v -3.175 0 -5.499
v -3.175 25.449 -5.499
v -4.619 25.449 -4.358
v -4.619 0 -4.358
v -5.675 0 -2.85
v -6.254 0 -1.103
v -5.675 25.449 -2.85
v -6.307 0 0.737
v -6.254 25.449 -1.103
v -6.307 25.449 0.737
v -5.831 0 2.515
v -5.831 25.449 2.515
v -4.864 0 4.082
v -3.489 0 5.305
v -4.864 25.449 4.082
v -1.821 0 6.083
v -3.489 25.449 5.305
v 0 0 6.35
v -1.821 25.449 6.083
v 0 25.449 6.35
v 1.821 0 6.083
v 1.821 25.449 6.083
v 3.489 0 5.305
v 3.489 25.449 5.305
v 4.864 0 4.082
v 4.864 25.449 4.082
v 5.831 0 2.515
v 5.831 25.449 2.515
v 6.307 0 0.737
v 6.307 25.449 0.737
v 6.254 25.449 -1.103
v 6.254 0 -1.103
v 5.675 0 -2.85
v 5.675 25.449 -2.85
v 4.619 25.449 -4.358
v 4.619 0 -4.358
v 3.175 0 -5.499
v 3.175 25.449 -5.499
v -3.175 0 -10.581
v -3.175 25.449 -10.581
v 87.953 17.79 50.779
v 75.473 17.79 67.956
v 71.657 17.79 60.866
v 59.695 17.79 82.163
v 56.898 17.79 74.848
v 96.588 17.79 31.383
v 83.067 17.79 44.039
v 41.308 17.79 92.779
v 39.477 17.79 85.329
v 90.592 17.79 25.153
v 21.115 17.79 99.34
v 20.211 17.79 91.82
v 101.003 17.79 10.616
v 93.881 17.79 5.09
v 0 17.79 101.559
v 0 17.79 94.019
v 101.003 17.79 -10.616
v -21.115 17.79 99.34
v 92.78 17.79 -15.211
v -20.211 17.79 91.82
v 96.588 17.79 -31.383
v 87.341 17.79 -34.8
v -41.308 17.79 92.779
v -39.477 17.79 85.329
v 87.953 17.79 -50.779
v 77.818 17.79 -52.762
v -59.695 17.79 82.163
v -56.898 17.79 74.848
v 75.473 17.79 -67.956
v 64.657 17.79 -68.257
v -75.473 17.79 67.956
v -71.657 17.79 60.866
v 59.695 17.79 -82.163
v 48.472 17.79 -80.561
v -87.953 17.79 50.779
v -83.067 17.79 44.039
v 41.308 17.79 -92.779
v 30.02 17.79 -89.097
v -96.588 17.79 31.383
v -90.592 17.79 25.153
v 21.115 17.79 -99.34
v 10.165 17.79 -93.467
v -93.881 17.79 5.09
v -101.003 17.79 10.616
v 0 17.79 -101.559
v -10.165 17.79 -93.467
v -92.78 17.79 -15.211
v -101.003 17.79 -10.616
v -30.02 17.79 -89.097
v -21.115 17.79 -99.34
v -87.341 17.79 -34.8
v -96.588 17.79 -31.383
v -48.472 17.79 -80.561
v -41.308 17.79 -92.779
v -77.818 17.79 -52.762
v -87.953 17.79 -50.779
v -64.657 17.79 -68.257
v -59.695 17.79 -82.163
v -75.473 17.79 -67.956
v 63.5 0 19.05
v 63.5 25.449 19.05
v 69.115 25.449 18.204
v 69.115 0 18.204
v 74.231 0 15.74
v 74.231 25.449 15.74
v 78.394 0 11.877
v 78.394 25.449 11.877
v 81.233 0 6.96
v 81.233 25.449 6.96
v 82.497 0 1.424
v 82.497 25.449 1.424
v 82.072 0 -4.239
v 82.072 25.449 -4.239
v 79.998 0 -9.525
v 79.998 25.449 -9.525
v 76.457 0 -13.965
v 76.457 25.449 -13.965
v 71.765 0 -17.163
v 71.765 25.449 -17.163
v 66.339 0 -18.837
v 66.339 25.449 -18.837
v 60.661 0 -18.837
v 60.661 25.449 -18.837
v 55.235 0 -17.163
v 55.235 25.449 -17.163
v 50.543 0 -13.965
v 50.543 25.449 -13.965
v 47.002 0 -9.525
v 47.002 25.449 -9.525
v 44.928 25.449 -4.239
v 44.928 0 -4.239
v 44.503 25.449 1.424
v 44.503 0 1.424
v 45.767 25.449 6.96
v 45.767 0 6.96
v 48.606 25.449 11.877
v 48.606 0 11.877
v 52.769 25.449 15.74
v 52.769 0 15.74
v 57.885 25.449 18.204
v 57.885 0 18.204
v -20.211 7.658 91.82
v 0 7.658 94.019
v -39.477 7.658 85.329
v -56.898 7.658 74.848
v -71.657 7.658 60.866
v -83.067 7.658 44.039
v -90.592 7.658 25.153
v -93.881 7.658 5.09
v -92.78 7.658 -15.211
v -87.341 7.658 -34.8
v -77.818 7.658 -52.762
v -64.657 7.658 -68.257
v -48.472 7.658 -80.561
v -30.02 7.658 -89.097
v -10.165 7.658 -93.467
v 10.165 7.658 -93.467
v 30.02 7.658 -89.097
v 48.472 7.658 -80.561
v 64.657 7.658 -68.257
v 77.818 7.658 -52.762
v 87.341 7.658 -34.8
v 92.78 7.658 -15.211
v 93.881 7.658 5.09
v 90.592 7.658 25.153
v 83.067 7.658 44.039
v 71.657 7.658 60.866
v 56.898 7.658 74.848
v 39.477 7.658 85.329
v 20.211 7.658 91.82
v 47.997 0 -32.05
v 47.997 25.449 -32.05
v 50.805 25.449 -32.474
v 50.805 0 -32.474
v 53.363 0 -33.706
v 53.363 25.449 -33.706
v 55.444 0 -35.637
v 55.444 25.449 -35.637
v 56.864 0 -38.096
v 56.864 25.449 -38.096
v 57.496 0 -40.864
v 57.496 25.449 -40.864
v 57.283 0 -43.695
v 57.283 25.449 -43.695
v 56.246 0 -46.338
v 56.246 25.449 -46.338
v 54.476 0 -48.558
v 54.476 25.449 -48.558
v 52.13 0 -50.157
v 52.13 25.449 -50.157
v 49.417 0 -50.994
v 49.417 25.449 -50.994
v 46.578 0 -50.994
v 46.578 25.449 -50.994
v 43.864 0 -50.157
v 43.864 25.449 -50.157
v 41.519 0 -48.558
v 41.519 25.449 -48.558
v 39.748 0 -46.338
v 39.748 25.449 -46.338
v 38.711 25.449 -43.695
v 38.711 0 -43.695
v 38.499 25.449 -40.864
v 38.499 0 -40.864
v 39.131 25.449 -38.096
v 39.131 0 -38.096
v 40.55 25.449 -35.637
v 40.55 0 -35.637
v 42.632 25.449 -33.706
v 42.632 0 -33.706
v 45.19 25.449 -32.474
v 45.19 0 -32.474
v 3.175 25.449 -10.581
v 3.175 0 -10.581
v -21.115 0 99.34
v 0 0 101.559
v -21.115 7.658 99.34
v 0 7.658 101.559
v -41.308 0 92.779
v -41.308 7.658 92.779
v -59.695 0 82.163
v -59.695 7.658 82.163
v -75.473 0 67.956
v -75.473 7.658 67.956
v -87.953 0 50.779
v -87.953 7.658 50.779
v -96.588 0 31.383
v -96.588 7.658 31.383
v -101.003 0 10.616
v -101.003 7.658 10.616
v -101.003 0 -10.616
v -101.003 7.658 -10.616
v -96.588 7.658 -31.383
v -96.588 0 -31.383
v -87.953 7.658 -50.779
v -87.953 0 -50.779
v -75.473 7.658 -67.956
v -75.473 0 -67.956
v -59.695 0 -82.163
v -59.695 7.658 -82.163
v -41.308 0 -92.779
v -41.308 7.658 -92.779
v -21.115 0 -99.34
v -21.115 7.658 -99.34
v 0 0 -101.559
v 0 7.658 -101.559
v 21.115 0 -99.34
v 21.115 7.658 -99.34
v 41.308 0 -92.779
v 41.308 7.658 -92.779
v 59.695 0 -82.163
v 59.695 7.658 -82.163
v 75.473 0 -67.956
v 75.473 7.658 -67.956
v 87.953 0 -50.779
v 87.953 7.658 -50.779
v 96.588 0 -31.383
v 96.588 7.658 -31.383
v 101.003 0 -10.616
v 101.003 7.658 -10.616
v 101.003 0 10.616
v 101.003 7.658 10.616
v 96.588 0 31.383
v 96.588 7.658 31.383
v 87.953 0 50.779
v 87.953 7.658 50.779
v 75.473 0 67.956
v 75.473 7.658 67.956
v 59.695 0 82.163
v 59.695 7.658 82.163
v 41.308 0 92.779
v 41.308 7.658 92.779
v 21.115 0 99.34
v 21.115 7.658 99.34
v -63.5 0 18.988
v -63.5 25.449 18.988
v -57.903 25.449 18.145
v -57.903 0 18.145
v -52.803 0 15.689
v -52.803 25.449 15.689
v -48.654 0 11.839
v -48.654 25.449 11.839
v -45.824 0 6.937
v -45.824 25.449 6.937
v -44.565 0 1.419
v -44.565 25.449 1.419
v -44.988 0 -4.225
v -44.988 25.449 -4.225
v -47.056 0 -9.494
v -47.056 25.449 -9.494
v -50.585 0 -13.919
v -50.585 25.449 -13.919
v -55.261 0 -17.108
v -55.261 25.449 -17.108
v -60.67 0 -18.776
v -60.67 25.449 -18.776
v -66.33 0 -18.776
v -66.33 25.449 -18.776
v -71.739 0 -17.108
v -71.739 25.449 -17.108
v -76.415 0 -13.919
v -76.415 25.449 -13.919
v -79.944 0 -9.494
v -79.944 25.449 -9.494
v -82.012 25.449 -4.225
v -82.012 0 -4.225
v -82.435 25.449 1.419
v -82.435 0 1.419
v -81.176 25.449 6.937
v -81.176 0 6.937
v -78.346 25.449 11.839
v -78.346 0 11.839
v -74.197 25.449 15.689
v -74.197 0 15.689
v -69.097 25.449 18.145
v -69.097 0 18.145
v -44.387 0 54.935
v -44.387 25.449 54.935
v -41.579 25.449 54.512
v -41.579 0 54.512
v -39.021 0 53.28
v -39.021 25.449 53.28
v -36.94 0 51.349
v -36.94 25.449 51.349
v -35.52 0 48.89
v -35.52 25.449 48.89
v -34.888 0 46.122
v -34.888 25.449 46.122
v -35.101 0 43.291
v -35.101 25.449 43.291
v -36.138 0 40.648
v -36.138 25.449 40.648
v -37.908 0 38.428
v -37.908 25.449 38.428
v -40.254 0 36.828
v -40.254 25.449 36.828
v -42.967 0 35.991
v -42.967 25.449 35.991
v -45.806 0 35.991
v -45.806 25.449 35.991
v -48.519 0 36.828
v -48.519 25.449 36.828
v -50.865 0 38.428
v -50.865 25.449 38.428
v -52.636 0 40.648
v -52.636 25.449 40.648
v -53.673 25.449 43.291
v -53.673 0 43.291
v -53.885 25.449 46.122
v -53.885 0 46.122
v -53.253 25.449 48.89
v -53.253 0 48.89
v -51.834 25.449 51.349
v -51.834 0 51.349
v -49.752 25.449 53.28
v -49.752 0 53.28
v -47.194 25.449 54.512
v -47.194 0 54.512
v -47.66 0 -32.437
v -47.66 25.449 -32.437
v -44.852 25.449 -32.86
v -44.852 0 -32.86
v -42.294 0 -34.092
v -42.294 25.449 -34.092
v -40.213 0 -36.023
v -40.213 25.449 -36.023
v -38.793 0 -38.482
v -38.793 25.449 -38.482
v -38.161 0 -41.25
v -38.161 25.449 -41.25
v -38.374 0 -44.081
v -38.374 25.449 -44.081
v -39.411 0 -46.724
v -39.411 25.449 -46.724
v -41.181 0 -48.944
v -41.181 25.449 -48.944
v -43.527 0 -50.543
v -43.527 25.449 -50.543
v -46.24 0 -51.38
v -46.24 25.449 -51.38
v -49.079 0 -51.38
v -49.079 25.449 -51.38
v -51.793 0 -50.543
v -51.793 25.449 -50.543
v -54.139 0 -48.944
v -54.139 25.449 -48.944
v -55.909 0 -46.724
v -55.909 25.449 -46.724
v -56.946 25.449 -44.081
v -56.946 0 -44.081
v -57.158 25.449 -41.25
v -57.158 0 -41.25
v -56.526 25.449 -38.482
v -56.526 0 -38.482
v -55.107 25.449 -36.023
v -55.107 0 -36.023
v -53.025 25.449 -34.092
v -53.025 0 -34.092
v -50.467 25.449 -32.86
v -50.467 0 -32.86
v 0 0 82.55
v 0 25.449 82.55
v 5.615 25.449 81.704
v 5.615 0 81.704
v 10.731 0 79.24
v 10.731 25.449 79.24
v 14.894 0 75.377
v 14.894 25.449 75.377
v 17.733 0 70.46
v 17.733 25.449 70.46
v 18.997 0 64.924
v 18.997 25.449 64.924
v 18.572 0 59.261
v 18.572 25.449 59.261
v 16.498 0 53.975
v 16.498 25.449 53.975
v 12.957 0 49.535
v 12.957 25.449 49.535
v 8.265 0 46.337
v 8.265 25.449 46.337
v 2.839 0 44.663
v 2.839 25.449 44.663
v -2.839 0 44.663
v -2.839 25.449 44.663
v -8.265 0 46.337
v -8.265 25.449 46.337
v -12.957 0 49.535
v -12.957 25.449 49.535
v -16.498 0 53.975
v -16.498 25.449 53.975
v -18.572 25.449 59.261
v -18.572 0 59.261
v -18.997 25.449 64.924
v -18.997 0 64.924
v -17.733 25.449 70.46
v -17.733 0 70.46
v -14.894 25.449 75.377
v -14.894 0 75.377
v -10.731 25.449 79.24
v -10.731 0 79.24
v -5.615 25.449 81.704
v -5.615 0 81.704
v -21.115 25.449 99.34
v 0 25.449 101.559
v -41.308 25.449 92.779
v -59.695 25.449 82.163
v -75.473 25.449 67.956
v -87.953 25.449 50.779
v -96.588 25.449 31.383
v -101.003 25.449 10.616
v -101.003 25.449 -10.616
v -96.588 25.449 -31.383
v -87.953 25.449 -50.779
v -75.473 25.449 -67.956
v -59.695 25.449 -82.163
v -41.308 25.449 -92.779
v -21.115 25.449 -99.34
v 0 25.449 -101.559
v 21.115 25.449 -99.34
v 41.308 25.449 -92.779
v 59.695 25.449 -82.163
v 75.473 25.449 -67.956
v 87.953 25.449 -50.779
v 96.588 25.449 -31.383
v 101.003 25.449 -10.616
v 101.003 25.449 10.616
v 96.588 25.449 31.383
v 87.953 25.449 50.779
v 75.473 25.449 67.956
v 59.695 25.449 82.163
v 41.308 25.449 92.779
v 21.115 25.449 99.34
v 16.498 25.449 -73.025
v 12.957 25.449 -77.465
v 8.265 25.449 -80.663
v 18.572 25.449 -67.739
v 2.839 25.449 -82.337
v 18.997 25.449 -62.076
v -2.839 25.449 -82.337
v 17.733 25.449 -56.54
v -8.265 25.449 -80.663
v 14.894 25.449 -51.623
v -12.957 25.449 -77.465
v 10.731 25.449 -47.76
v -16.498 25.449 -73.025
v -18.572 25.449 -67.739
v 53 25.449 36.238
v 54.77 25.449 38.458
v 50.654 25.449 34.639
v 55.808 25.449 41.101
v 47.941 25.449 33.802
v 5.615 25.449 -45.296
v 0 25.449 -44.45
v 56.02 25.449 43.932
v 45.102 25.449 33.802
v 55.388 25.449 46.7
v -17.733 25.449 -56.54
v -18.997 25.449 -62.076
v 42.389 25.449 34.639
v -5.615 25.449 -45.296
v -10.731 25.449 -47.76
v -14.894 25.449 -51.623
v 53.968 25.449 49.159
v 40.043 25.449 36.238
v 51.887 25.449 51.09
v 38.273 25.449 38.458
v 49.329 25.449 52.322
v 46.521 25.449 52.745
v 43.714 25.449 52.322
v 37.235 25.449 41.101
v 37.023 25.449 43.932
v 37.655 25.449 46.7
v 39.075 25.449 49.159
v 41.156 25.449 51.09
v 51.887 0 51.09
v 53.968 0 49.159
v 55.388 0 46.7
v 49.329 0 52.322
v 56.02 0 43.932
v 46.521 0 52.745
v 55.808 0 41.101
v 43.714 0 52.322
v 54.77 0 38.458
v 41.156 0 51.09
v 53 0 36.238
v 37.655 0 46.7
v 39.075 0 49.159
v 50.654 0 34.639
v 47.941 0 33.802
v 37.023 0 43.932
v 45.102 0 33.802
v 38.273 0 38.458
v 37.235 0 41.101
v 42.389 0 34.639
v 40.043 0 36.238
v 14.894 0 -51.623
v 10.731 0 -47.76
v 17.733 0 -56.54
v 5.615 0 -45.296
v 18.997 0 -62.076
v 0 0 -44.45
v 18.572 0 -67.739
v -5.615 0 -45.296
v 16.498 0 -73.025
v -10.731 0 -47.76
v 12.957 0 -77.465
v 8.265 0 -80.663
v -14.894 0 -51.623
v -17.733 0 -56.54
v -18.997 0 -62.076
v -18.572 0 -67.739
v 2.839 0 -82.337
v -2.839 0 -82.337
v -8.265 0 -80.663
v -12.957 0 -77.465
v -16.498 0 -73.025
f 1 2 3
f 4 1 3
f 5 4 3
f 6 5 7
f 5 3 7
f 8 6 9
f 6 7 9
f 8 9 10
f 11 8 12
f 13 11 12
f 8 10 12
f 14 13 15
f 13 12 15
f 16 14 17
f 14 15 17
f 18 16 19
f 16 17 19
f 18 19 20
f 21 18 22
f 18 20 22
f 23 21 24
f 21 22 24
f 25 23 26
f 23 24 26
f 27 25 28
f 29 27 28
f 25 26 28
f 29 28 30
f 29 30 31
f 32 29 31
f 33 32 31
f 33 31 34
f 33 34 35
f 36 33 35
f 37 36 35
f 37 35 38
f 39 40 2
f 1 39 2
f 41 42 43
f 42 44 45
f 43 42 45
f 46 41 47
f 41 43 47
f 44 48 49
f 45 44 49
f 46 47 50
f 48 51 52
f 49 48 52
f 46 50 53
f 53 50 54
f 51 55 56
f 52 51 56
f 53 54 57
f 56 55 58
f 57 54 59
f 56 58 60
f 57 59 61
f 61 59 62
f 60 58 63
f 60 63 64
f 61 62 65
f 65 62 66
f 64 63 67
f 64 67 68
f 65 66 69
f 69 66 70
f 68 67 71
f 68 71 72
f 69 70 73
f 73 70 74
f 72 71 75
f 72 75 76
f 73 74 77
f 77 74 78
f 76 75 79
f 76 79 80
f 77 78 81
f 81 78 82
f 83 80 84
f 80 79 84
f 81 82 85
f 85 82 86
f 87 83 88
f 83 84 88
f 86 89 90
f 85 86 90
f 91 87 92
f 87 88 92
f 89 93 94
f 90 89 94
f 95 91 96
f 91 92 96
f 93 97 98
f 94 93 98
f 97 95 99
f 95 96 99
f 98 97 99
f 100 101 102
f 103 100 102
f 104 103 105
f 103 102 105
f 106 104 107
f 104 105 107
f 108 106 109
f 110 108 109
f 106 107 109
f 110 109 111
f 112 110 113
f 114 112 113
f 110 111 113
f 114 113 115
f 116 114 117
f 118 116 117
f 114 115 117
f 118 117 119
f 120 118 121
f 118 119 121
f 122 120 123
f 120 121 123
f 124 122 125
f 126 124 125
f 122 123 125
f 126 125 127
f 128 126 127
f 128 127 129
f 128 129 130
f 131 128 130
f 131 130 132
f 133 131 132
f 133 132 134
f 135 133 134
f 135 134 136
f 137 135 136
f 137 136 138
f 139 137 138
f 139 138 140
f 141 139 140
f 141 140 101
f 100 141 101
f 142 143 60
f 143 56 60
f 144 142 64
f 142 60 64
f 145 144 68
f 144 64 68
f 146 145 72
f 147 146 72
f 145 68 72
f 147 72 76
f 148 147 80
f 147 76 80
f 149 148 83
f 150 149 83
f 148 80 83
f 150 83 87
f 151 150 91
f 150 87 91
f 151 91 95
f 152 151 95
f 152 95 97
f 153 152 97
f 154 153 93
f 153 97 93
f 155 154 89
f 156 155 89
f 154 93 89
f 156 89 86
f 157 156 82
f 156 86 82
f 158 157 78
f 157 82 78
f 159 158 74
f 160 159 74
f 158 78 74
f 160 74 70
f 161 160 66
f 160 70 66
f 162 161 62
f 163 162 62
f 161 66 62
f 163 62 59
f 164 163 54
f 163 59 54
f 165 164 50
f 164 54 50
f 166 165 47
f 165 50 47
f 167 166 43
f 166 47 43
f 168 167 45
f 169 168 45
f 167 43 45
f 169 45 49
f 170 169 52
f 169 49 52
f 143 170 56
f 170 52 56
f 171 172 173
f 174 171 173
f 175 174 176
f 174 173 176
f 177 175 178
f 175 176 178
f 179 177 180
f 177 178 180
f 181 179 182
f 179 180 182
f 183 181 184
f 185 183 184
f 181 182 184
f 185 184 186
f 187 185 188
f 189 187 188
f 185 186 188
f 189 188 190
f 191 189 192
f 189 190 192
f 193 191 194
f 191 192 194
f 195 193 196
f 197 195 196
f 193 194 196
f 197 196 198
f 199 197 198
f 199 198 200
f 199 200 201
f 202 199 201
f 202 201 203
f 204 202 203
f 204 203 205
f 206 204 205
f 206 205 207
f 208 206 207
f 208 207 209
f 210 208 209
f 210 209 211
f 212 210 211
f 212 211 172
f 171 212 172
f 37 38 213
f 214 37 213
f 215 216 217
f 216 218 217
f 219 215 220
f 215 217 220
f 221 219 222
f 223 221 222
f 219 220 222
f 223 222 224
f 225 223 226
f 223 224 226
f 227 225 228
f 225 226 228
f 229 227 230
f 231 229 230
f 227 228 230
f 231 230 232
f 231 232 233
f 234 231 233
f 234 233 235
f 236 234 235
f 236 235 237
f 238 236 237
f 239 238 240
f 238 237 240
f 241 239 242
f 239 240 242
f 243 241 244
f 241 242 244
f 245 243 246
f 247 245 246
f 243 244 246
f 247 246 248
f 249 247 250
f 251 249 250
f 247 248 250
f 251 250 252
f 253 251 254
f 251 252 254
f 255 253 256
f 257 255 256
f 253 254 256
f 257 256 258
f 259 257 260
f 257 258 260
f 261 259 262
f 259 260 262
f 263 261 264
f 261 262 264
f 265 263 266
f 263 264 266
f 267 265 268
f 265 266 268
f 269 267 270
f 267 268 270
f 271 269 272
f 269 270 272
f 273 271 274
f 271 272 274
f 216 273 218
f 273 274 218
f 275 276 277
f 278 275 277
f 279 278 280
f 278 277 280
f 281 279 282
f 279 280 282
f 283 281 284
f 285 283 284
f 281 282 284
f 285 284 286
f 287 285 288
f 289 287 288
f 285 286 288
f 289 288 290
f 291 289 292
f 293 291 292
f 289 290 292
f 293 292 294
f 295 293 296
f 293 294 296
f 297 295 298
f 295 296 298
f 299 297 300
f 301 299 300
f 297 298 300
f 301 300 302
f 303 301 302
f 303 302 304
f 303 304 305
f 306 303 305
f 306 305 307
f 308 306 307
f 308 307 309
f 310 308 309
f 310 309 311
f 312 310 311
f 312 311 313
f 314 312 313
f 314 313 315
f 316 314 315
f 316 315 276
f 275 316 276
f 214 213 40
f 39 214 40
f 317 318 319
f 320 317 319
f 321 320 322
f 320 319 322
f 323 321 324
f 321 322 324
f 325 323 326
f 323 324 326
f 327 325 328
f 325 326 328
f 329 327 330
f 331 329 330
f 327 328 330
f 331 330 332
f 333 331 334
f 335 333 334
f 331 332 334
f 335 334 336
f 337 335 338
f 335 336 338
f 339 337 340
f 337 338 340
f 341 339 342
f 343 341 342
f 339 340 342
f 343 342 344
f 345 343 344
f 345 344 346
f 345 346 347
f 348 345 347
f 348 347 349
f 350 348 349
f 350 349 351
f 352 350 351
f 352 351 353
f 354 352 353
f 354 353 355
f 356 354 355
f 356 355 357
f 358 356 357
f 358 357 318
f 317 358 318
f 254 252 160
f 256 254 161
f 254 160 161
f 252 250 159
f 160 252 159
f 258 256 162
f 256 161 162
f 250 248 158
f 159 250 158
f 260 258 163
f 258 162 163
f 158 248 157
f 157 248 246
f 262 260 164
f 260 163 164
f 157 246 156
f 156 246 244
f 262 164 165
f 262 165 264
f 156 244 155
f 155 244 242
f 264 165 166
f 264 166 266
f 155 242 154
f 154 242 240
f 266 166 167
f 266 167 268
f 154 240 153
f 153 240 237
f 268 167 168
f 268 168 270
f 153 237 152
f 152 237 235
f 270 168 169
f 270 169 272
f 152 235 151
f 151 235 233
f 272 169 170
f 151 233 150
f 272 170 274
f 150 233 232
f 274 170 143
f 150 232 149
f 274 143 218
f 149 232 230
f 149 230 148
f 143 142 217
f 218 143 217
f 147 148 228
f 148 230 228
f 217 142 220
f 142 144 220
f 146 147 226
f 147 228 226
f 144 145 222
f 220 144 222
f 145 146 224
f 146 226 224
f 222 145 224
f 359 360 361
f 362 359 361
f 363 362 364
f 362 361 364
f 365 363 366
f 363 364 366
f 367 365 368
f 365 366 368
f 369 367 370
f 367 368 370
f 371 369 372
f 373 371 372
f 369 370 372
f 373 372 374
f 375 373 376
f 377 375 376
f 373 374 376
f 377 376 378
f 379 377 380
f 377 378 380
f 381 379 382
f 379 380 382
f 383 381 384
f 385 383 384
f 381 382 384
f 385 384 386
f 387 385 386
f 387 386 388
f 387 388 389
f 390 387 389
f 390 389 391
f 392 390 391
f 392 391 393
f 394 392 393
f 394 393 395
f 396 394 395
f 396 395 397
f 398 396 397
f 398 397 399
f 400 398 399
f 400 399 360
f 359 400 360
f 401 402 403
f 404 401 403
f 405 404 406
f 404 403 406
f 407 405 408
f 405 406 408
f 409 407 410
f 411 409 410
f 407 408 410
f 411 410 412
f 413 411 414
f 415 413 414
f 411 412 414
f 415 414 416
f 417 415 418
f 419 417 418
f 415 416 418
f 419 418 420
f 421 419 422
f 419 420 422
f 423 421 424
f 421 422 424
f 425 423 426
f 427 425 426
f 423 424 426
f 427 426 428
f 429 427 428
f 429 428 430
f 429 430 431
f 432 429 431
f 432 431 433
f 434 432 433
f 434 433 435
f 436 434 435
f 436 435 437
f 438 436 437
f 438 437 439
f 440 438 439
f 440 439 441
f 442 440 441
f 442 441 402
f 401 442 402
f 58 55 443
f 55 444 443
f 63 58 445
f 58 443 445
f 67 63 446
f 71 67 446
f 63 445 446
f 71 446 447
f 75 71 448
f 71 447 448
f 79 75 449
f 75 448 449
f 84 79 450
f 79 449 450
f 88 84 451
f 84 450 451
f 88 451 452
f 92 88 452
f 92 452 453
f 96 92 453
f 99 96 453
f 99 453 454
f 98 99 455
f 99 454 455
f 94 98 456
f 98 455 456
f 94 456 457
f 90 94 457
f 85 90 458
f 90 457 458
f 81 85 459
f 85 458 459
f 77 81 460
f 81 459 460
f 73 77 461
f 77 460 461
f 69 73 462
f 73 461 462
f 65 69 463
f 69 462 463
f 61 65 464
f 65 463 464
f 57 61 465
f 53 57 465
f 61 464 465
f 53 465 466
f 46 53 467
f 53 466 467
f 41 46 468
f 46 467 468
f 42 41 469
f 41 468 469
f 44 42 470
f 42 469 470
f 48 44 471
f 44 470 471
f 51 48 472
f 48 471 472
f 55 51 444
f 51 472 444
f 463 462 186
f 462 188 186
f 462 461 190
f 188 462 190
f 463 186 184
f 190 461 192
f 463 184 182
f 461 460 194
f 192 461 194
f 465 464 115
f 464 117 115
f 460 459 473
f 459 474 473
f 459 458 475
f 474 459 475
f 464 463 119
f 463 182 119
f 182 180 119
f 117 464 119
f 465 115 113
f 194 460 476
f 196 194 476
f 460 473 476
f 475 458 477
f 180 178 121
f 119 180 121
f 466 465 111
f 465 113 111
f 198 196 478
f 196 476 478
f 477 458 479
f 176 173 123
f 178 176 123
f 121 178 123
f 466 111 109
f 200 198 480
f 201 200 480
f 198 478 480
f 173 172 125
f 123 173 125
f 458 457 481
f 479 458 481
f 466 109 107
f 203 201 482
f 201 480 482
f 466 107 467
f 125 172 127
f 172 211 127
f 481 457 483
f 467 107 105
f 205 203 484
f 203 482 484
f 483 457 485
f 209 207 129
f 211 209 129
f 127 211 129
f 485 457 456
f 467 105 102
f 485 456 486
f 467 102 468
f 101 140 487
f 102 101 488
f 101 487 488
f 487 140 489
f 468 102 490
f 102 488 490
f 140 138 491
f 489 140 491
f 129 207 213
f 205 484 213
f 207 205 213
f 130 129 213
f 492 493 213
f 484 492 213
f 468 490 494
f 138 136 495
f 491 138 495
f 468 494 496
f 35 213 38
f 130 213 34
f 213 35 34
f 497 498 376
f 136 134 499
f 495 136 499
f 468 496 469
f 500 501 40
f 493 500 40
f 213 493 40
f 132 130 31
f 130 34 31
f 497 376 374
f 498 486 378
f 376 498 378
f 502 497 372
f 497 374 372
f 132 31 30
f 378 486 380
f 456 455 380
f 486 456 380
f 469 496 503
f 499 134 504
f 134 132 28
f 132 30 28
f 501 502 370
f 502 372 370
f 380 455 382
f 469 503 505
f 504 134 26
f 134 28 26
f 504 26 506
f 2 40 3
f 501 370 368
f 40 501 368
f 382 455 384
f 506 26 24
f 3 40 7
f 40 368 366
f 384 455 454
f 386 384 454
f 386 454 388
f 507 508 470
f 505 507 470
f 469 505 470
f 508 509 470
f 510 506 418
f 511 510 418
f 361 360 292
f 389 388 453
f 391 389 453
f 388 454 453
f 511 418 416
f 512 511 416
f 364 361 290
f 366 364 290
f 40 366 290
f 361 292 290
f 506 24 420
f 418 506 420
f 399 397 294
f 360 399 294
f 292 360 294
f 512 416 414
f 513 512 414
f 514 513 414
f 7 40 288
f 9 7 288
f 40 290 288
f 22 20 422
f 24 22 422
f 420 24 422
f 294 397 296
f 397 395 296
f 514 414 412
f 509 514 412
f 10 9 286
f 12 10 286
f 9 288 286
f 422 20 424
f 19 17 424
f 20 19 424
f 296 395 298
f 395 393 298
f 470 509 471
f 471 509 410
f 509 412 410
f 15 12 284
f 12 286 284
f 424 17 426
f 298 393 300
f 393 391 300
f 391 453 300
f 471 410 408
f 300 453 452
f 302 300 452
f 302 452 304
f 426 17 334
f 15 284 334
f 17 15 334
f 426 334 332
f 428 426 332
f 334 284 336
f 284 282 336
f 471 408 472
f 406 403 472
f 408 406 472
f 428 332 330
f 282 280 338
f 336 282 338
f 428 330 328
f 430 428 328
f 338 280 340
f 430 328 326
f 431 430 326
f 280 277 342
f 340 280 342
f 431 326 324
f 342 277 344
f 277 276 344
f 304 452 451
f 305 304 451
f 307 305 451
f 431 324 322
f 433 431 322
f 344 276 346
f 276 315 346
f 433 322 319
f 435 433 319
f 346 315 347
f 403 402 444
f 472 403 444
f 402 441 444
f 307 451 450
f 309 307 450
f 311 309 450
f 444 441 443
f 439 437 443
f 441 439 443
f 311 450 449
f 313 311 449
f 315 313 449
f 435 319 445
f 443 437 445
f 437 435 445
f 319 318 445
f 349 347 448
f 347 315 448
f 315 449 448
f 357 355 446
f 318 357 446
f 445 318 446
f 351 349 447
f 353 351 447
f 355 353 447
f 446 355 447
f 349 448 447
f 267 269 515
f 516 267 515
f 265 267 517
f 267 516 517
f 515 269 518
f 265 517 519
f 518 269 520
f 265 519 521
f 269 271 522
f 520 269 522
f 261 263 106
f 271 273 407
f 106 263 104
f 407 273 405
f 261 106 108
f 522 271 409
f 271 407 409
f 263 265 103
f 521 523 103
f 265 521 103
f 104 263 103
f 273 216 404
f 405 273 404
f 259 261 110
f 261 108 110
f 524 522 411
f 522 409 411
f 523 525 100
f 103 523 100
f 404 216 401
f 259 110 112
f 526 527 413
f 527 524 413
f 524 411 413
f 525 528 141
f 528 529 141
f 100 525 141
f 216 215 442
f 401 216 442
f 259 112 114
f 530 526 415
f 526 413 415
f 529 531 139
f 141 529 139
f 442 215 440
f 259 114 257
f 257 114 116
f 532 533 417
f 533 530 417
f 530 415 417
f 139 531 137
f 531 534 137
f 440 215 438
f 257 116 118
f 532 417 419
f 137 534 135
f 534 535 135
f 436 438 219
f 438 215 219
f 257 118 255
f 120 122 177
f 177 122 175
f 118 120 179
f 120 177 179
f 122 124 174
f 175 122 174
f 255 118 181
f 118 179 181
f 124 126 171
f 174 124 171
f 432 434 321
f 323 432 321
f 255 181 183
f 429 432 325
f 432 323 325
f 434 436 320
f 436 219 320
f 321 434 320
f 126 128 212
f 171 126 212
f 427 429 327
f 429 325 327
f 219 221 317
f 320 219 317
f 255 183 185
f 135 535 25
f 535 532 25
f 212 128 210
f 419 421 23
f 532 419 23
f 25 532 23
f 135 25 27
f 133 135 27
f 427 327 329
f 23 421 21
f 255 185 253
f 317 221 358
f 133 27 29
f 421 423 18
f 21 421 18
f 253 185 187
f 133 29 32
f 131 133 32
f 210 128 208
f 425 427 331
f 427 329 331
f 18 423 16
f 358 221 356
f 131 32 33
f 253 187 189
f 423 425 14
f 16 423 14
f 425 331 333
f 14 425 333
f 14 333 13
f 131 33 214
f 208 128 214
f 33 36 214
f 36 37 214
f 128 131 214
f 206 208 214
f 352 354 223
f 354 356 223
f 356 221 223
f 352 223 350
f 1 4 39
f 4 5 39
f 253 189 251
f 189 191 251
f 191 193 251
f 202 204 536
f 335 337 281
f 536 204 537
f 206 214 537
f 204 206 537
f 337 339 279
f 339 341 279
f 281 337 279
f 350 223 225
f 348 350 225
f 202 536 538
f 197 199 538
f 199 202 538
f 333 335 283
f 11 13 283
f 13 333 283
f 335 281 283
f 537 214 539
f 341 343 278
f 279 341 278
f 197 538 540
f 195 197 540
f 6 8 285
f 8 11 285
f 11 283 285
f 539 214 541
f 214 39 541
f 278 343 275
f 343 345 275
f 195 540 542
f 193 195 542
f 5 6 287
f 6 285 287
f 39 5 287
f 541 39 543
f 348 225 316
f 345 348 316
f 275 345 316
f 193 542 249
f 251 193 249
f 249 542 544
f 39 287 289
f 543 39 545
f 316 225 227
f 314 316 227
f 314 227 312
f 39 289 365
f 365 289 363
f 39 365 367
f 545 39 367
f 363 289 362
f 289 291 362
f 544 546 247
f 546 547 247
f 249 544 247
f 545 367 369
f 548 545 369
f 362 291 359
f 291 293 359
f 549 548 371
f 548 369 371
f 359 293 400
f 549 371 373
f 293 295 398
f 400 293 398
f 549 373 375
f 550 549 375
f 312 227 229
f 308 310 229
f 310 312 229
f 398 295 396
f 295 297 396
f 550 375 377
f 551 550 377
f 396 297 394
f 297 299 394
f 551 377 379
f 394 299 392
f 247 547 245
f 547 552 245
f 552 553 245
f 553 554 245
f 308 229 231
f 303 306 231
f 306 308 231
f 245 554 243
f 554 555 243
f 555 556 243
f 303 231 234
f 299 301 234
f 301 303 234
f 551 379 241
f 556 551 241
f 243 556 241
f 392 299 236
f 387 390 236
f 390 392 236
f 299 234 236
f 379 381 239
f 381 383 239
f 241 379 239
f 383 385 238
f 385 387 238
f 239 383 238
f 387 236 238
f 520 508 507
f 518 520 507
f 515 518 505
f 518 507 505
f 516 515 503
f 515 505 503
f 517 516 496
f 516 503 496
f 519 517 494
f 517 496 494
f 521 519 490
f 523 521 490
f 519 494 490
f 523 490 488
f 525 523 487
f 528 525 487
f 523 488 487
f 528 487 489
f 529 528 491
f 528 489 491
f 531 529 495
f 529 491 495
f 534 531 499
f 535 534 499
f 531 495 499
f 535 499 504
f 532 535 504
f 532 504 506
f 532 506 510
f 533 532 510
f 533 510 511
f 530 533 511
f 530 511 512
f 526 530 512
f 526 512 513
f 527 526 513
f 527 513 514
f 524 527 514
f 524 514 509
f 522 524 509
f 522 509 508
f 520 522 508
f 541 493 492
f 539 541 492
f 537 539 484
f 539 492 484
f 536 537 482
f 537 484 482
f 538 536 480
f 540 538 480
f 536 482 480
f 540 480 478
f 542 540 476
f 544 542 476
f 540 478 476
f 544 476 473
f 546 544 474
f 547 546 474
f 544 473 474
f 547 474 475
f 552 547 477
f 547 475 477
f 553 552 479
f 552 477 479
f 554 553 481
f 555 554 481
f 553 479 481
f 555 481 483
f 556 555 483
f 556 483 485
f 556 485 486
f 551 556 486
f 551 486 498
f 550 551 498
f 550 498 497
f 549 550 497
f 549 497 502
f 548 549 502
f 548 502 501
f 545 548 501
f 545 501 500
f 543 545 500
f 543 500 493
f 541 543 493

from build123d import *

# Parameters (mm, degrees)
SKETCH3_R          = 19.05
SKETCH3_R_2        = 9.525
SKETCH3_R_3        = 18.988330579
CUT_EXTRUDE2_DEPTH = 146.863175777


with BuildPart() as part:
    # Sketch1 → Revolve1 (revolve)
    with BuildSketch(Plane.XY, mode=Mode.PRIVATE) as revolve1_sk:
        Polygon((0, 0), (101.558930414, 0), (101.558930414, 7.658156006), (94.018592193, 7.658156006), (94.018592193, 17.79048549), (101.558930414, 17.79048549), (101.558930414, 25.448641496), (0, 25.448641496), align=None)
    revolve(revolve1_sk.sketch.rotate(Axis((0, 25.448641496, 0), (0, -1, 0)), 90), axis=Axis((0, 25.448641496, 0), (0, -1, 0)))

    # Sketch3 → Cut-Extrude2 (cut, through all)
    with BuildSketch(Plane(origin=(0, 25.448641496, 0), x_dir=(1, 0, 0), z_dir=(0, 1, 0))):
        with BuildLine():
            Line((3.175, 10.580896572), (-3.175, 10.580896572))
            Line((-3.175, 10.580896572), (-3.175, 5.499261314))
            ThreePointArc((-3.175, 5.499261314), (0, -6.35), (3.175, 5.499261314))
            Line((3.175, 5.499261314), (3.175, 10.580896572))
        make_face()
        with Locations(Location((63.5, 0, 0), (0, 0, 270))):
            Circle(SKETCH3_R)
        with Locations(Location((47.997207269, 41.575450622, 0), (0, 0, 270))):
            Circle(SKETCH3_R_2)
        with Locations(Location((46.521487533, -43.220379426, 0), (0, 0, 270))):
            Circle(SKETCH3_R_2)
        with Locations(Location((0, 63.5, 0), (0, 0, 270))):
            Circle(SKETCH3_R)
        with Locations(Location((0, -63.5, 0), (0, 0, 270))):
            Circle(SKETCH3_R)
        with Locations(Location((-47.659859298, 41.961742239, 0), (0, 0, 270))):
            Circle(SKETCH3_R_2)
        with Locations(Location((-44.386705472, -45.410025075, 0), (0, 0, 270))):
            Circle(SKETCH3_R_2)
        with Locations(Location((-63.5, 0, 0), (0, 0, 270))):
            Circle(SKETCH3_R_3)
    extrude(amount=-CUT_EXTRUDE2_DEPTH, mode=Mode.SUBTRACT)


solid = part.part
